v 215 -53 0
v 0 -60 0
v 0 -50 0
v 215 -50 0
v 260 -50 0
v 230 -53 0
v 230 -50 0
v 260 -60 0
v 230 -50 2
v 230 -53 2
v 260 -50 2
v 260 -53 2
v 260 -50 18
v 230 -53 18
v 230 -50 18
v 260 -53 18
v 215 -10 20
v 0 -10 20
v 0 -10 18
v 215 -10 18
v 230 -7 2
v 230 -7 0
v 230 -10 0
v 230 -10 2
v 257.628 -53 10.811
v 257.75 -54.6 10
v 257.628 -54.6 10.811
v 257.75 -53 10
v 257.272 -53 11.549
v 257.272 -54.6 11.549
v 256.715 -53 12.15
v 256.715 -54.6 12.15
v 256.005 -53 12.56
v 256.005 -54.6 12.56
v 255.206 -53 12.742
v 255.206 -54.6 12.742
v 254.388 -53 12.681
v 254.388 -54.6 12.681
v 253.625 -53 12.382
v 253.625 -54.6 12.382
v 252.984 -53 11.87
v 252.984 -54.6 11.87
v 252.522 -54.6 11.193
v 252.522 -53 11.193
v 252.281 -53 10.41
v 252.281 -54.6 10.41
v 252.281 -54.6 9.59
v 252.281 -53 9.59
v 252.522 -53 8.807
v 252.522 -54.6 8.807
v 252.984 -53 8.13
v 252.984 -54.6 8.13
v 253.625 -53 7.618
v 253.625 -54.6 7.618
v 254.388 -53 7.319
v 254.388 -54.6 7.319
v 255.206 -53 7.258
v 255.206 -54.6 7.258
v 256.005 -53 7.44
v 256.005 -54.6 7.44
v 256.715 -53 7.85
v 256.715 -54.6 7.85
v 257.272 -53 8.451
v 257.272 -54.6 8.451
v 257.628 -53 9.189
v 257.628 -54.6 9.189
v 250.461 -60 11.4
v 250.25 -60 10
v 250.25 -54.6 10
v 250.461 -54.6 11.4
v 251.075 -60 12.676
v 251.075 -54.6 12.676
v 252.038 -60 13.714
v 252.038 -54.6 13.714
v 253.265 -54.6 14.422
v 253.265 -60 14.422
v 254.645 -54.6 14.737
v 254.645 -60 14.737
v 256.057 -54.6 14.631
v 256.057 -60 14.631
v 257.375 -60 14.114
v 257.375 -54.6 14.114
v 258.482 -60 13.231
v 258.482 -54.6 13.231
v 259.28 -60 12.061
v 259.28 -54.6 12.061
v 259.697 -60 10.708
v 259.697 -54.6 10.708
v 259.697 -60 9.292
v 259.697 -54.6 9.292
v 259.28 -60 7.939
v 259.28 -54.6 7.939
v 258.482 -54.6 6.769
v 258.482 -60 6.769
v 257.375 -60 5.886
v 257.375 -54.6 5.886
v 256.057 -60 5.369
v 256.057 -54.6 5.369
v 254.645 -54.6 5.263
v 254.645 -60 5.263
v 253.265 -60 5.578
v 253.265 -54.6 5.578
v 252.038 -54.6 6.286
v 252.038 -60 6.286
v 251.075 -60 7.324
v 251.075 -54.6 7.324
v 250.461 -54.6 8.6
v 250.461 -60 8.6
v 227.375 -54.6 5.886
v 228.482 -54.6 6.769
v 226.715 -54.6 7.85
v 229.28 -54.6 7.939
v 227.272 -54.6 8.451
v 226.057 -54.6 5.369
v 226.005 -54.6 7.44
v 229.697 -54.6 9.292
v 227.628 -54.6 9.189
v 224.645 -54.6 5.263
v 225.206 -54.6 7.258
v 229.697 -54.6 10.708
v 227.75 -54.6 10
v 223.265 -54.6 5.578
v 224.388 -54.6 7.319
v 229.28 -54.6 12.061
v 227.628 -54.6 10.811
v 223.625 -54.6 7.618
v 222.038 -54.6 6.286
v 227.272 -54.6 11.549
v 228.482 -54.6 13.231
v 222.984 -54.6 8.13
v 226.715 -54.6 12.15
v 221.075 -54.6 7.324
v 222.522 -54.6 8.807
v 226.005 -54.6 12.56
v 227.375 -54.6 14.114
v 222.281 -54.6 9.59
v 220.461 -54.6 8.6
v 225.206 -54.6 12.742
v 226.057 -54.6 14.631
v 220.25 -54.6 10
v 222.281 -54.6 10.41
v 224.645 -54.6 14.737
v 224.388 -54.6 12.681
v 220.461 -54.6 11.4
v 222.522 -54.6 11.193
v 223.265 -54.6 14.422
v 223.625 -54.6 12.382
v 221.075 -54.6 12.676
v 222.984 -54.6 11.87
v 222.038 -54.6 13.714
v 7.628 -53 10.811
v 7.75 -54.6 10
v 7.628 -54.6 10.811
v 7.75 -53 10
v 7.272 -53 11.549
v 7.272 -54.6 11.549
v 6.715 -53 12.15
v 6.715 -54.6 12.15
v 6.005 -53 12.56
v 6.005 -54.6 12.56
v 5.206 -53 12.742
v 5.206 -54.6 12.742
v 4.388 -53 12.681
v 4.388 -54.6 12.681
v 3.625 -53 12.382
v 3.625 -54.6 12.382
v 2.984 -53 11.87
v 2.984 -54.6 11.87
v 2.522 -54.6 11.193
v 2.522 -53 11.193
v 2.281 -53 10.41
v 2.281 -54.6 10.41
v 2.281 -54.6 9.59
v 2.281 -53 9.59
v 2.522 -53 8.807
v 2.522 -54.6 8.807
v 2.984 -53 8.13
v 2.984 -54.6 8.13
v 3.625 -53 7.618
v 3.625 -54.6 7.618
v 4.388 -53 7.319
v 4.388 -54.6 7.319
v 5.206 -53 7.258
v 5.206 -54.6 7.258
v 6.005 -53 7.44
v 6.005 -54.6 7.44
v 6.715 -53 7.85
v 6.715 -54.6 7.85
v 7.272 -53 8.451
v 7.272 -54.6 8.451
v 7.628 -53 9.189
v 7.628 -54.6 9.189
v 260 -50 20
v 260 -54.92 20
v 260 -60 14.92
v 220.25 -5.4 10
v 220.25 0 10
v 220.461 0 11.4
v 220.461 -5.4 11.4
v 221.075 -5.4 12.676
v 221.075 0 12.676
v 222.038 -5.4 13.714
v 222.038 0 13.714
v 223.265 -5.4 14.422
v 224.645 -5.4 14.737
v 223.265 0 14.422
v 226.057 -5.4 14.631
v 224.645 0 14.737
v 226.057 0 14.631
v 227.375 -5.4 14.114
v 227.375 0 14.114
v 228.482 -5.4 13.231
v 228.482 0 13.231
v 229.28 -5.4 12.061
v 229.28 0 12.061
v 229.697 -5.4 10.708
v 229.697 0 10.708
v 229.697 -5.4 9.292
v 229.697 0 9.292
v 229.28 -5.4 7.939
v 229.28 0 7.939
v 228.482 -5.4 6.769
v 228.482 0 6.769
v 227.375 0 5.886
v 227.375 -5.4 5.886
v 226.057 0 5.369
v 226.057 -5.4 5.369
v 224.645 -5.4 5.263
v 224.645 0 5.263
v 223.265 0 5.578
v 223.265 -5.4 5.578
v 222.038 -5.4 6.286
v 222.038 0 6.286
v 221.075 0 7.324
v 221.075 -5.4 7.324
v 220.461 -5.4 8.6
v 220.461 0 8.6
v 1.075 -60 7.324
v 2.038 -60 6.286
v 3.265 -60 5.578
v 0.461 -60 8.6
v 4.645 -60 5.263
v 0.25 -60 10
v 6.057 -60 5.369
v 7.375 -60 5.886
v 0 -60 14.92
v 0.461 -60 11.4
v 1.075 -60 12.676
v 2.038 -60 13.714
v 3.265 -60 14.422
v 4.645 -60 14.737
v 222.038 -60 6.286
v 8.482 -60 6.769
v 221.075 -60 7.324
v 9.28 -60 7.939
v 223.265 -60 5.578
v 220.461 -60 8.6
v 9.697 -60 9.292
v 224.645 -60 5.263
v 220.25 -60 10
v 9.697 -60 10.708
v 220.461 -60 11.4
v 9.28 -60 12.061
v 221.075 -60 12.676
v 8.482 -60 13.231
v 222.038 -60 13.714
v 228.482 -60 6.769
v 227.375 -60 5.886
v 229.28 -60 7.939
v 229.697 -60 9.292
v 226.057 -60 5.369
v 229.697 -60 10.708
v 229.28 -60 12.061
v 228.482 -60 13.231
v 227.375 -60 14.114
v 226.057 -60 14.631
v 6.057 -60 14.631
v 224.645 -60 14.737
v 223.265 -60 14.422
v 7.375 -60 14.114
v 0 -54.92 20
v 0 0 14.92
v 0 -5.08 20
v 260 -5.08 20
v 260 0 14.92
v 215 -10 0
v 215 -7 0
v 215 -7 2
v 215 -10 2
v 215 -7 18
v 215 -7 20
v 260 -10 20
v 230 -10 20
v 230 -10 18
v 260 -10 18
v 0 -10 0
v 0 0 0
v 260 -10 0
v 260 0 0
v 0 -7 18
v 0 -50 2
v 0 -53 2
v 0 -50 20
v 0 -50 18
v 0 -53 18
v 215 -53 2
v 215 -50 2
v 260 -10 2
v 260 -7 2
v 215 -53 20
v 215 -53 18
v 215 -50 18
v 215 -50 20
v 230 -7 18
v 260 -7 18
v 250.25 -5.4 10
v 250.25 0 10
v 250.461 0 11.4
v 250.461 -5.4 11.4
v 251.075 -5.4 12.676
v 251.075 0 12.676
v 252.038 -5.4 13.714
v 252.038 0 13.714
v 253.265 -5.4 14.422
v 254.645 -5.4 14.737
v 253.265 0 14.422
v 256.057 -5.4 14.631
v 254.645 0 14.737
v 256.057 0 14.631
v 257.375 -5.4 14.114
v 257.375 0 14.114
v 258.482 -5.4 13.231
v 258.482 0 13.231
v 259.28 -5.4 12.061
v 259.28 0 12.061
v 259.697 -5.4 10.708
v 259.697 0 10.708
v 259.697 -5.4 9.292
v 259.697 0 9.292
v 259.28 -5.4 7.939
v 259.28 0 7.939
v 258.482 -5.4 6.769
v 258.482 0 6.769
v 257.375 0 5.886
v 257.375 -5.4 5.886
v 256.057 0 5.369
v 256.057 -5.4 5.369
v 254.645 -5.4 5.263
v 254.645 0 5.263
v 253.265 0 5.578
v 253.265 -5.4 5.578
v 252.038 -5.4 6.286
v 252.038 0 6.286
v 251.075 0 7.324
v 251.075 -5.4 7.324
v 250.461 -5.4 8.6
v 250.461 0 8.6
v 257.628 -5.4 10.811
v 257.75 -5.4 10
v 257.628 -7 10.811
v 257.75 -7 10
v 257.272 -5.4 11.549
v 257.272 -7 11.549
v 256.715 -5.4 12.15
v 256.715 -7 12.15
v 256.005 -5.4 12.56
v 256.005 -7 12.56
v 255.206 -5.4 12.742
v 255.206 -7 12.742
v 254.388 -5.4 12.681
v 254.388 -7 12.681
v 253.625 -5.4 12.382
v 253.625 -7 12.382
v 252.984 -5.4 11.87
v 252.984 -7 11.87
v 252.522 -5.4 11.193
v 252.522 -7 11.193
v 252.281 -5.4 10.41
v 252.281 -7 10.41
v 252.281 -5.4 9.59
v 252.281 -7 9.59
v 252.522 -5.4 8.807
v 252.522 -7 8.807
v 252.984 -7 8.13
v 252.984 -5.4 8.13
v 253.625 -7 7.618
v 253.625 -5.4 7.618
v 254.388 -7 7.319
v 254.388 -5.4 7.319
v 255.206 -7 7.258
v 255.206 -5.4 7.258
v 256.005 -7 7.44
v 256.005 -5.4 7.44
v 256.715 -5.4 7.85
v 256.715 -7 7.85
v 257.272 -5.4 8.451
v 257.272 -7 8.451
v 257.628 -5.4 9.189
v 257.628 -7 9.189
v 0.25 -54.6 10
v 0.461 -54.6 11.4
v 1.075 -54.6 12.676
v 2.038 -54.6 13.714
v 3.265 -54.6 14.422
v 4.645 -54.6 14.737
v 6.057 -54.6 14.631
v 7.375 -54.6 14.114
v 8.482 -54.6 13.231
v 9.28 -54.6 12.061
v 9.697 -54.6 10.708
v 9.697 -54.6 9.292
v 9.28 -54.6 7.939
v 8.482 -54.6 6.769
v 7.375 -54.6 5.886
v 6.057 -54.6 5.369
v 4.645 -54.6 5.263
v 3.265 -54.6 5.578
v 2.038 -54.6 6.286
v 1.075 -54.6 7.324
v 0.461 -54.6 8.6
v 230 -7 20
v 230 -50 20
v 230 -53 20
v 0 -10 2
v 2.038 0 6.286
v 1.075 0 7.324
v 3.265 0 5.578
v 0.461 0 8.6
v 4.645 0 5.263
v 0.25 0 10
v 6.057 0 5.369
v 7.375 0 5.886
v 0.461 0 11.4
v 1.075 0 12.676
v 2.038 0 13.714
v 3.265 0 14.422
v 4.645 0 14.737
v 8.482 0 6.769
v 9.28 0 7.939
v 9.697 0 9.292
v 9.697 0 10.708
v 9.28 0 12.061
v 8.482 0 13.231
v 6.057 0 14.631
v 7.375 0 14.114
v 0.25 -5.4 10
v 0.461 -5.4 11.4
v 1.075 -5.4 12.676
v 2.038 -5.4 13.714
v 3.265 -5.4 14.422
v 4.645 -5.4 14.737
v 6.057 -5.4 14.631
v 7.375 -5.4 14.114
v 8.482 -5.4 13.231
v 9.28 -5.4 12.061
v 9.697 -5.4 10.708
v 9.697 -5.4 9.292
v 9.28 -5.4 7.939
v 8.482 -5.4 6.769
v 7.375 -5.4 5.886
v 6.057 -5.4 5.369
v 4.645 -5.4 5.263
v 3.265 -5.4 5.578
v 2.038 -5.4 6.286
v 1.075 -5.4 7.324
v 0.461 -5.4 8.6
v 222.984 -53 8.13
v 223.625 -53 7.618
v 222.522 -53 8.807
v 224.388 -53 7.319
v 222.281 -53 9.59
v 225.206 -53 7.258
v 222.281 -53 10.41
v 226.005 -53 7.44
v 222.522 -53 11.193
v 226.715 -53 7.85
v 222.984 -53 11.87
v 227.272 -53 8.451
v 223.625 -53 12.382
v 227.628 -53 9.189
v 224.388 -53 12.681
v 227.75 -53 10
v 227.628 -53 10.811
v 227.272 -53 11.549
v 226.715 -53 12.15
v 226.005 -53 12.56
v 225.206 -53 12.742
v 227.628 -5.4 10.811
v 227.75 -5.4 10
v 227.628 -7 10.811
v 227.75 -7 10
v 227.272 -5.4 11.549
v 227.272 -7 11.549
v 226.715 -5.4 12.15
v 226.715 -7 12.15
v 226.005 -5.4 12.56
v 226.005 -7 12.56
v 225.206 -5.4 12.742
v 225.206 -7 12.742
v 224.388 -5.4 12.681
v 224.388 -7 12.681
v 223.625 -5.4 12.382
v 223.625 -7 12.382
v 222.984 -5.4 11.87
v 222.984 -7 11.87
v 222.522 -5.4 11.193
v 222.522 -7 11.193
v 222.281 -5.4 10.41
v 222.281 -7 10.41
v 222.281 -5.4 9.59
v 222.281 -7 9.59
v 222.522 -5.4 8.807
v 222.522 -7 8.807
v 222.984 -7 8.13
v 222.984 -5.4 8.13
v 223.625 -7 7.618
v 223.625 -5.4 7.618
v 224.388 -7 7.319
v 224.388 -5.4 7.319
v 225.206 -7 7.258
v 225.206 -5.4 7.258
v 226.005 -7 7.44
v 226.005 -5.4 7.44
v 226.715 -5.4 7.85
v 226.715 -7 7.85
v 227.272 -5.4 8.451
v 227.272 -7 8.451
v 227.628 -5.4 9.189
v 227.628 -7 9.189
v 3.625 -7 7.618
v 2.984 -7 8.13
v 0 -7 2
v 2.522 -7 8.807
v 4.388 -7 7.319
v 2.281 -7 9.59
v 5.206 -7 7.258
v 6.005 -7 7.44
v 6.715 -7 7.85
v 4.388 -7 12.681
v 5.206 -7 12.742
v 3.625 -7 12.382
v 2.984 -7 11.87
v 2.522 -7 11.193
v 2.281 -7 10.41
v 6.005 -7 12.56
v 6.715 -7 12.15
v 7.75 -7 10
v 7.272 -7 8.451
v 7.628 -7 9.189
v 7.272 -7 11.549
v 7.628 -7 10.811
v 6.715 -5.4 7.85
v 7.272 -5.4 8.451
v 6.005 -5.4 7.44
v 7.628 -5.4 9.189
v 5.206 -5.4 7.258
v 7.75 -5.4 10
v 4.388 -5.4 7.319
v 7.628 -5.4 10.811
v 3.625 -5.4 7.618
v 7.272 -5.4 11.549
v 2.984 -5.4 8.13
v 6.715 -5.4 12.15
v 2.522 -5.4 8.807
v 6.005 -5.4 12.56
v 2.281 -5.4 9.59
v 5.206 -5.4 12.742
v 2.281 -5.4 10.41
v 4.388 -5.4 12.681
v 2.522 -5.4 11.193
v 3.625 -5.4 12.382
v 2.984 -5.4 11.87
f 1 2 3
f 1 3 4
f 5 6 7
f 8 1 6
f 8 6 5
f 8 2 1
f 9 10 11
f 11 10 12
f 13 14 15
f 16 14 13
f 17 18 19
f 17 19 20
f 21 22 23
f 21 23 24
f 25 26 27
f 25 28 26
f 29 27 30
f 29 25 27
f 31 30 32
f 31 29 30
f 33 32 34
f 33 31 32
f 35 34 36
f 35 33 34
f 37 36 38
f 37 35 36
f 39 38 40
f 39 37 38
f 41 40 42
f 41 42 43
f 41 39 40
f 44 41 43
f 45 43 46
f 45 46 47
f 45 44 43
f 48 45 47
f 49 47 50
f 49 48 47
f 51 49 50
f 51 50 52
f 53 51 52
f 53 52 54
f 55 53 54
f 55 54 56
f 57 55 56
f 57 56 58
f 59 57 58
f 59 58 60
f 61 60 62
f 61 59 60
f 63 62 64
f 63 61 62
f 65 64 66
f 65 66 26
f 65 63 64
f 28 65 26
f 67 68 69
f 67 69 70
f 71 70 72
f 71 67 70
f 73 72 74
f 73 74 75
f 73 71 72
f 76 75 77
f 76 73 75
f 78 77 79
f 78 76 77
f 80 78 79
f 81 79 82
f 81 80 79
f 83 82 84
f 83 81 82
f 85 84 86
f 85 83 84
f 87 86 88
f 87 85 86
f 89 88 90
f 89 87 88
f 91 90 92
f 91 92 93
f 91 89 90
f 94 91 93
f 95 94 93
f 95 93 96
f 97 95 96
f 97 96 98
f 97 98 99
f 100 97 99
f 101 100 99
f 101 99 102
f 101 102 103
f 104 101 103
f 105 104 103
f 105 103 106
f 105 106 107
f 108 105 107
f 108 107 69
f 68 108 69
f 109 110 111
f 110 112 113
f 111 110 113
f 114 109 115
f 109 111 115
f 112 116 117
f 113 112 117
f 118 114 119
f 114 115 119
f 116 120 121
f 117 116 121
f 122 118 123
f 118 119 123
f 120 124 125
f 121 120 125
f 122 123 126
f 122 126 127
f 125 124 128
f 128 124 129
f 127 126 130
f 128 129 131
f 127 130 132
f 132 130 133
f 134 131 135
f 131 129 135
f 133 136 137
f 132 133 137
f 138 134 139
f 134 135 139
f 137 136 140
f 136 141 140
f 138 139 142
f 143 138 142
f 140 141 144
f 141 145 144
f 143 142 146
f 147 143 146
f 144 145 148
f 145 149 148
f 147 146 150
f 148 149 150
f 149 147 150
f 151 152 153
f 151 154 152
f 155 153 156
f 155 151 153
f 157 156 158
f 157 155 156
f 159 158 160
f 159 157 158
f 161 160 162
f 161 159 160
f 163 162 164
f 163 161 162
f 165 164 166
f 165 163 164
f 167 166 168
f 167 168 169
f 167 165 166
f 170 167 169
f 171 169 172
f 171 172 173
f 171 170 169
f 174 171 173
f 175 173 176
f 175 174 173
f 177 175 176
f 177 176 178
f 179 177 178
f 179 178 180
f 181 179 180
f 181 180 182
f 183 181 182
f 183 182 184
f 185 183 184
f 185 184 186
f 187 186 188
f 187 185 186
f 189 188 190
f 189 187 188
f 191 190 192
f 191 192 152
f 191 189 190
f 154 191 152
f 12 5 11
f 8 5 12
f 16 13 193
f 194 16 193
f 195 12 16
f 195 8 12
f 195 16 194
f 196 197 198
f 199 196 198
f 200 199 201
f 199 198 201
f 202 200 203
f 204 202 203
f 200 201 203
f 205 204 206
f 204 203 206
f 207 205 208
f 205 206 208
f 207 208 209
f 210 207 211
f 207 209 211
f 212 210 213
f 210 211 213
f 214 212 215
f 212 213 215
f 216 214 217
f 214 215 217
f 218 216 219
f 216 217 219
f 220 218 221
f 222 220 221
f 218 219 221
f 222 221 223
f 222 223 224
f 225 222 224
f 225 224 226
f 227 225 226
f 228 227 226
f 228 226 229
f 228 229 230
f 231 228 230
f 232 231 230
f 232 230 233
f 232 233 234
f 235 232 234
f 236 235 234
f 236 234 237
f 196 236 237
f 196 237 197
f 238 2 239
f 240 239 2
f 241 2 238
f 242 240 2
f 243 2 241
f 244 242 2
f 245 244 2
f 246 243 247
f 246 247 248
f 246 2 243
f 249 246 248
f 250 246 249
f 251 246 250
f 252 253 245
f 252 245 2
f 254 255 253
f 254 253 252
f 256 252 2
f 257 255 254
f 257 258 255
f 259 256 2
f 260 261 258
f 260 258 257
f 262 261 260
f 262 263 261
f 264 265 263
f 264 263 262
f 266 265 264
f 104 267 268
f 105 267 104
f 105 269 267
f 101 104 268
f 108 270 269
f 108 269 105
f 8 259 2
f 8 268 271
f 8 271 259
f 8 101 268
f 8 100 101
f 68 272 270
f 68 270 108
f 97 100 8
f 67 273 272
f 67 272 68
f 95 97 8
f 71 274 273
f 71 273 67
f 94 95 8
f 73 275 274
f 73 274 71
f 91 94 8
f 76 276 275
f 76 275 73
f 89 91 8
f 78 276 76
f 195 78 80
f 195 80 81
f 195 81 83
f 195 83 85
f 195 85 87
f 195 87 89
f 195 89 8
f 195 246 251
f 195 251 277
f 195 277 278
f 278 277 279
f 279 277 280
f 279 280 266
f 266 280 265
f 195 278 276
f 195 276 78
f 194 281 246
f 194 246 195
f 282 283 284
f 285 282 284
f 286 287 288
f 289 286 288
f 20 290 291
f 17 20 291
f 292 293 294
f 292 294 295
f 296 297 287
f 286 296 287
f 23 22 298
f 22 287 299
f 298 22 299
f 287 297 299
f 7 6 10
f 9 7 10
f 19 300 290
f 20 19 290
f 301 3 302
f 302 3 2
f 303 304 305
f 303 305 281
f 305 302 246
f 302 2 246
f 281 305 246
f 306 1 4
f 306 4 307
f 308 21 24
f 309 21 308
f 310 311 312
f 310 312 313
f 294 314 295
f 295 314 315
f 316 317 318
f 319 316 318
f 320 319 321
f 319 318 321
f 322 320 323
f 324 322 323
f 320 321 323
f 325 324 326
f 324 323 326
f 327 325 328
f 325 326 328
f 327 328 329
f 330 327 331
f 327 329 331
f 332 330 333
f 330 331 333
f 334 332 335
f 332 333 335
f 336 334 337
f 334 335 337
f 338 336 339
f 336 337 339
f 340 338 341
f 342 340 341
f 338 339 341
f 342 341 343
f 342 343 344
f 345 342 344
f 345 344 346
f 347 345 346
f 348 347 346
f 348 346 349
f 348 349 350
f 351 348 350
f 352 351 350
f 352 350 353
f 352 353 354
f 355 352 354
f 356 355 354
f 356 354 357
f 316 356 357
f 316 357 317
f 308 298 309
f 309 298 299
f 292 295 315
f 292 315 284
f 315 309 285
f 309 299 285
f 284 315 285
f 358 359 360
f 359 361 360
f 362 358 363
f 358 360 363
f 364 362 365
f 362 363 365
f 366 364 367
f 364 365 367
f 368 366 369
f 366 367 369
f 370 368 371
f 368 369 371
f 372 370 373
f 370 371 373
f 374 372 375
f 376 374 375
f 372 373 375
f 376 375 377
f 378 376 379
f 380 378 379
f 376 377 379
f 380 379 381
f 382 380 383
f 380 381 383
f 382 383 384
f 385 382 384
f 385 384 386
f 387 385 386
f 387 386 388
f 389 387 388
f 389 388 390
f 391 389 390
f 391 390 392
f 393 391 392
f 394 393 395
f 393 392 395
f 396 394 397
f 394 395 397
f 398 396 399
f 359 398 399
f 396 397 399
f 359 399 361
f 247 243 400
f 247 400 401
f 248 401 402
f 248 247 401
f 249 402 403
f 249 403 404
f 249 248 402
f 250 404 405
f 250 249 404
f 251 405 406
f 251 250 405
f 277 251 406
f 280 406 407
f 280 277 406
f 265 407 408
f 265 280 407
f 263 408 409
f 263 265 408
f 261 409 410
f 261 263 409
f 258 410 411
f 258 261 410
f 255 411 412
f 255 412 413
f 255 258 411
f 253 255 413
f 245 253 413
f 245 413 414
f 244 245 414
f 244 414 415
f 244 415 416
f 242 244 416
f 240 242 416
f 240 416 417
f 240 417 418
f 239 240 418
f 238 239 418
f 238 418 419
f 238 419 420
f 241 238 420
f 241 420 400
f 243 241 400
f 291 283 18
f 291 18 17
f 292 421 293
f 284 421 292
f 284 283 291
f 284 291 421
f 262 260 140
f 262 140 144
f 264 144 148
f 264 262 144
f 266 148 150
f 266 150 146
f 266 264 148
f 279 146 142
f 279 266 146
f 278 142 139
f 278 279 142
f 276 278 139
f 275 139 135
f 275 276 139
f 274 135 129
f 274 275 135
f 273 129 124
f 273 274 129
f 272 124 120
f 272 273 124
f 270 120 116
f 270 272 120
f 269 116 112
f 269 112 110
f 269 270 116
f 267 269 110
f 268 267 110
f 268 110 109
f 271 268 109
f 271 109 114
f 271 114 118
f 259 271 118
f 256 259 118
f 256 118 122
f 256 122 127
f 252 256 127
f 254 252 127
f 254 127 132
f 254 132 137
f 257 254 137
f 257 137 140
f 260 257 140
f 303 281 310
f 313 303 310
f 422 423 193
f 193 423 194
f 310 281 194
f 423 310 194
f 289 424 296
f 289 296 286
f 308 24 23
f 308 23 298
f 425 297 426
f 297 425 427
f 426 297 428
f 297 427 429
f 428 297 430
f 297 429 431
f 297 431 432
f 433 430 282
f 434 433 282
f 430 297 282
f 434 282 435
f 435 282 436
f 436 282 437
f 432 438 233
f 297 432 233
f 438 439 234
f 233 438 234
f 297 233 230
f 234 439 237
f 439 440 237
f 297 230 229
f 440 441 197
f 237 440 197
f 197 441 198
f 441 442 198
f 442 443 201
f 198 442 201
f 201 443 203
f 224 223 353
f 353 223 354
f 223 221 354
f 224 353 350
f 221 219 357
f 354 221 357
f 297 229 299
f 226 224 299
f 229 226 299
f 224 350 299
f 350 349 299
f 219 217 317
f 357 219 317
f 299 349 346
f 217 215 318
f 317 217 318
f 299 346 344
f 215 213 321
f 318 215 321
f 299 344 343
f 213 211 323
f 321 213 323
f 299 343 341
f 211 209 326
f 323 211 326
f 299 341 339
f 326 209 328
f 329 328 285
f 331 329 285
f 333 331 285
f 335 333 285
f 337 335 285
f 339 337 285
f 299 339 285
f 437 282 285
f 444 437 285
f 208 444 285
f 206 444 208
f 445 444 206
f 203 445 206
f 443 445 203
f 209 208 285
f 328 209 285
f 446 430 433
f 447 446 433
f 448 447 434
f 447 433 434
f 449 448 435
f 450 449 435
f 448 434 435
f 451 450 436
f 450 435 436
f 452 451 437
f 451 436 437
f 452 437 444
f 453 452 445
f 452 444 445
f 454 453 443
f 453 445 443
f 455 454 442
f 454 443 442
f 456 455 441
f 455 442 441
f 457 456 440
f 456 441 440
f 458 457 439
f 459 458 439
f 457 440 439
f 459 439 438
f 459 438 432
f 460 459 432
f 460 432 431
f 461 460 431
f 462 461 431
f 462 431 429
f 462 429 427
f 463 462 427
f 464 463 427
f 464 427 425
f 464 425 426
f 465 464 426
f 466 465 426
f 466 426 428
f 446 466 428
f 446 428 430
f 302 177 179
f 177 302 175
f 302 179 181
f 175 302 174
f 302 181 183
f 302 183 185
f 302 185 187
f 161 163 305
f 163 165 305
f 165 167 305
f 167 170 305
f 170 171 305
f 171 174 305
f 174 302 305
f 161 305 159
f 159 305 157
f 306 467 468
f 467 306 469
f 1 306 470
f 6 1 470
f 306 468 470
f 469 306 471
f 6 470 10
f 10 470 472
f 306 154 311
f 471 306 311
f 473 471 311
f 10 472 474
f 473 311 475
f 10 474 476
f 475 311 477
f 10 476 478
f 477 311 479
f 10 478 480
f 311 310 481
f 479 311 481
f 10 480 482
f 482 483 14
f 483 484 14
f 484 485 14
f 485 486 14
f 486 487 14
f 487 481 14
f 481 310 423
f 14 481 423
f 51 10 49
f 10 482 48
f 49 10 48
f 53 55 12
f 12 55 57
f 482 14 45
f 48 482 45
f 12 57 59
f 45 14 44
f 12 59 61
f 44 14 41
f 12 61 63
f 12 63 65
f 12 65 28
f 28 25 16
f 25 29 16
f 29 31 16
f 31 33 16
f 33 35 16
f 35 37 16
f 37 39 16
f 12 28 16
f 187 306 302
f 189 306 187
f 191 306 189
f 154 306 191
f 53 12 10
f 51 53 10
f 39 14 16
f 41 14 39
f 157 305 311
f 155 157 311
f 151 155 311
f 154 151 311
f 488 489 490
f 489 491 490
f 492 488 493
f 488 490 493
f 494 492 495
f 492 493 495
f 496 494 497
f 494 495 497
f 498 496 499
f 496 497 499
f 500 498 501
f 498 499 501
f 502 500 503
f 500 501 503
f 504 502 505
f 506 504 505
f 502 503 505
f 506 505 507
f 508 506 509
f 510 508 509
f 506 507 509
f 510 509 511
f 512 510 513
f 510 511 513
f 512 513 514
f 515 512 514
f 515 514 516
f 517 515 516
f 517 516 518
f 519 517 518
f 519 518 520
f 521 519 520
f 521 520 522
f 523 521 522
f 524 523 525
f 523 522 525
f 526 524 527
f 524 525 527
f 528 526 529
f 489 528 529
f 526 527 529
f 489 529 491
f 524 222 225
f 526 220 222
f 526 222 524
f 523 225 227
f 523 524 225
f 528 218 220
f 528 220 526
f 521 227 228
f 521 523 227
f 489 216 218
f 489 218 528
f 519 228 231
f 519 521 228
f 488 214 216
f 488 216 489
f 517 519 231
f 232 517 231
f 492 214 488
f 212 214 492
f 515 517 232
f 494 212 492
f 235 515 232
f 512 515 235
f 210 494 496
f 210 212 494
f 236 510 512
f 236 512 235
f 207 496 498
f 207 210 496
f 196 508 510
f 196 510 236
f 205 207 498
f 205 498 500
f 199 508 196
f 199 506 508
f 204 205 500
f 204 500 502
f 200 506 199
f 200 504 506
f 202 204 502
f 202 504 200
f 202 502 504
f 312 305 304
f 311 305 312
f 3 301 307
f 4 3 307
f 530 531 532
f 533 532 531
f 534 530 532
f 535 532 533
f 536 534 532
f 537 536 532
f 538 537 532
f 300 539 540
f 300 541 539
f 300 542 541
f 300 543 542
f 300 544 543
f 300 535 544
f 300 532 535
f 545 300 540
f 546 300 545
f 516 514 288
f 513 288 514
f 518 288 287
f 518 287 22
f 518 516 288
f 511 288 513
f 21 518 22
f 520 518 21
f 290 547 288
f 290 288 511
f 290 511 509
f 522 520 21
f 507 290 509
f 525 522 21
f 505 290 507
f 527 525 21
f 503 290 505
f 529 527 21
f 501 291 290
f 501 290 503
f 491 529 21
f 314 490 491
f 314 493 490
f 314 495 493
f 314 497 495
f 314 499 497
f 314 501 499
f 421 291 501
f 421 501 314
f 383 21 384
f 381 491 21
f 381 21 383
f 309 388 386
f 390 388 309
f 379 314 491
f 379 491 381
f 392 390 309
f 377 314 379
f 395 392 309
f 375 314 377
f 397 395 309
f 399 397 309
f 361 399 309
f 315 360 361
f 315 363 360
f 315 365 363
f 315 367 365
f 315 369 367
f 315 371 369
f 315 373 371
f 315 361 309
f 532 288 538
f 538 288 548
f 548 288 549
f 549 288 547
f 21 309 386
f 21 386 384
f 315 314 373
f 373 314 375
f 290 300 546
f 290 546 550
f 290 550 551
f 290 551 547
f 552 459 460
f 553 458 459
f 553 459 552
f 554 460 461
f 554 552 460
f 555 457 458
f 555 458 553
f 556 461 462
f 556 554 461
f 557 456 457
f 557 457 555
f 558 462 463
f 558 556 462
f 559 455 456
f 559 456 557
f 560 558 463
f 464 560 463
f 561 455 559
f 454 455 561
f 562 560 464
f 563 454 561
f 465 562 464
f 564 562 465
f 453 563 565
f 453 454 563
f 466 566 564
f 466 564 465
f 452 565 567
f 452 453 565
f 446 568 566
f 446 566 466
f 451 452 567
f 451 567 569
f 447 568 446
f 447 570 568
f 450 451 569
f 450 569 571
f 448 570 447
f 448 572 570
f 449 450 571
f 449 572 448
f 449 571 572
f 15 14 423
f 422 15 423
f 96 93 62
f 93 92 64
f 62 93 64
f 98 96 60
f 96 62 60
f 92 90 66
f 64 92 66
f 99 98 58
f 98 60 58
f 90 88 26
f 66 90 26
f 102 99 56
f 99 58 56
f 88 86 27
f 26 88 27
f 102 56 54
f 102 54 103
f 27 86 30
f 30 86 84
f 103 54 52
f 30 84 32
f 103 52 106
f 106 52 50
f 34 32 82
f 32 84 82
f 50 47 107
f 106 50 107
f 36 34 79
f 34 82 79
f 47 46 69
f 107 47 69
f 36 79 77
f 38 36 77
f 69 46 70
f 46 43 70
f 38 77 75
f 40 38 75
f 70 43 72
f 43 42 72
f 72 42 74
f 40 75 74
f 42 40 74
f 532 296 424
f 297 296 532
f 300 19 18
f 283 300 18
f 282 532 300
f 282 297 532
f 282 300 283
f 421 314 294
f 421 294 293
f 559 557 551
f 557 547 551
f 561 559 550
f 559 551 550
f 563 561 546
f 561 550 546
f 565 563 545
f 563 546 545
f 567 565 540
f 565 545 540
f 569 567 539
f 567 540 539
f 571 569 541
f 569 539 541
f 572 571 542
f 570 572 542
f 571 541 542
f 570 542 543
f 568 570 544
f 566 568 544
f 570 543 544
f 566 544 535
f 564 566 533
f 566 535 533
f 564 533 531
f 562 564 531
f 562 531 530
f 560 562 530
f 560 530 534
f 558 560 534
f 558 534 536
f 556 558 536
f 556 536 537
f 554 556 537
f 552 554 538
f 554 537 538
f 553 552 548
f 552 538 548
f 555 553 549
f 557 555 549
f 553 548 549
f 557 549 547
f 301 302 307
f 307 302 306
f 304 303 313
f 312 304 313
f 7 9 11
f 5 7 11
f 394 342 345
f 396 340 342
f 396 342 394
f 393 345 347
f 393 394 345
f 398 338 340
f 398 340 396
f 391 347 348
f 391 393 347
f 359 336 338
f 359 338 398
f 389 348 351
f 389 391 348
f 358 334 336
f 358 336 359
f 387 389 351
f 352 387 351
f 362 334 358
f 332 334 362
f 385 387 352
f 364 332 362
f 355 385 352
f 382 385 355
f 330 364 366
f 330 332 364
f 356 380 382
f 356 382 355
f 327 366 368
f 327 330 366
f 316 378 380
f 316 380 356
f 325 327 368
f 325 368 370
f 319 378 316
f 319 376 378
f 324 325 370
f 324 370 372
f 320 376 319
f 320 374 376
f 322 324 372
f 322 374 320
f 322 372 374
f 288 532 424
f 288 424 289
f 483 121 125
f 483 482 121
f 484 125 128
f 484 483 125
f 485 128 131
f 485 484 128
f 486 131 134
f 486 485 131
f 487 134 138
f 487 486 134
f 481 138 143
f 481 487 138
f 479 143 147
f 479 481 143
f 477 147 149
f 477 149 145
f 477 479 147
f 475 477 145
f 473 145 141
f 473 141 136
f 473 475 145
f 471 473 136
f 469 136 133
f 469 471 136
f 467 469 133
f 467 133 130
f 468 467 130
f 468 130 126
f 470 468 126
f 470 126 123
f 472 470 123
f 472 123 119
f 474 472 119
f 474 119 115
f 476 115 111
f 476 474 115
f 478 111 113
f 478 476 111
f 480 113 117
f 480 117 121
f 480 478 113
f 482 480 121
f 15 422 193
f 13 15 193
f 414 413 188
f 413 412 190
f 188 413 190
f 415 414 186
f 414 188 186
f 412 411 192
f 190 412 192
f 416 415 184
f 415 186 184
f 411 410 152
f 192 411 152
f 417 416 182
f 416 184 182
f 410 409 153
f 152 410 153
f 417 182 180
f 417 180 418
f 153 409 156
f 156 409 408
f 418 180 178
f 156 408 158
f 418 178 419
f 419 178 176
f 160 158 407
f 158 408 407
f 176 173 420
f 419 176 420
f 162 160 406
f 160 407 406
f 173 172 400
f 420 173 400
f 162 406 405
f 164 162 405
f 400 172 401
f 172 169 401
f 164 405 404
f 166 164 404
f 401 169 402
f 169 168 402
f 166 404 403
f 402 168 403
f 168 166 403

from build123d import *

# Parameters (mm, degrees)
F0_W           = 260
F0_H           = 20
F1_DEPTH       = 7
F3_D           = 5.5
F3_CBORE_D     = 9.5
F3_CBORE_DEPTH = 5.4
F4_W           = 215
F4_H           = 2
F4_W_2         = 30
F5_DEPTH       = 3
F6_SIZE        = 5.08


with BuildPart() as f1:
    # F0 (on Front) → F1 (new body)
    with BuildSketch(Plane.XZ):
        with Locations((130, 10)):
            Rectangle(F0_W, F0_H)
    extrude(amount=F1_DEPTH)

    # F3 (through all)
    with Locations(Plane(origin=(0, 0, 0), x_dir=(-1, 0, 0), z_dir=(0, 1, 0))):
        with Locations((-225, 10), (-5, 10), (-255, 10)):
            CounterBoreHole(F3_D / 2, F3_CBORE_D / 2, F3_CBORE_DEPTH)

    # F4 (on face) → F5 (join)
    with BuildSketch(Plane.XZ.offset(7)):
        with Locations((107.5, 19)):
            Rectangle(F4_W, F4_H)
        with Locations((245, 19)):
            Rectangle(F4_W_2, F4_H)
        with Locations((107.5, 1)):
            Rectangle(F4_W, F4_H)
        with Locations((245, 1)):
            Rectangle(F4_W_2, F4_H)
    extrude(amount=F5_DEPTH)

    # F6
    f6_edges = [f1.edges().sort_by_distance(p)[0] for p in [
        (130, 0, 20),
    ]]
    chamfer(f6_edges, length=F6_SIZE)


with BuildPart() as f8_1:
    # F8: instance of F1
    add(f1.part.mirror(Plane(origin=(107.5, -30, 19), x_dir=(1, 0, 0), z_dir=(0, -1, 0))))


solid = Compound([f1.part, f8_1.part])
